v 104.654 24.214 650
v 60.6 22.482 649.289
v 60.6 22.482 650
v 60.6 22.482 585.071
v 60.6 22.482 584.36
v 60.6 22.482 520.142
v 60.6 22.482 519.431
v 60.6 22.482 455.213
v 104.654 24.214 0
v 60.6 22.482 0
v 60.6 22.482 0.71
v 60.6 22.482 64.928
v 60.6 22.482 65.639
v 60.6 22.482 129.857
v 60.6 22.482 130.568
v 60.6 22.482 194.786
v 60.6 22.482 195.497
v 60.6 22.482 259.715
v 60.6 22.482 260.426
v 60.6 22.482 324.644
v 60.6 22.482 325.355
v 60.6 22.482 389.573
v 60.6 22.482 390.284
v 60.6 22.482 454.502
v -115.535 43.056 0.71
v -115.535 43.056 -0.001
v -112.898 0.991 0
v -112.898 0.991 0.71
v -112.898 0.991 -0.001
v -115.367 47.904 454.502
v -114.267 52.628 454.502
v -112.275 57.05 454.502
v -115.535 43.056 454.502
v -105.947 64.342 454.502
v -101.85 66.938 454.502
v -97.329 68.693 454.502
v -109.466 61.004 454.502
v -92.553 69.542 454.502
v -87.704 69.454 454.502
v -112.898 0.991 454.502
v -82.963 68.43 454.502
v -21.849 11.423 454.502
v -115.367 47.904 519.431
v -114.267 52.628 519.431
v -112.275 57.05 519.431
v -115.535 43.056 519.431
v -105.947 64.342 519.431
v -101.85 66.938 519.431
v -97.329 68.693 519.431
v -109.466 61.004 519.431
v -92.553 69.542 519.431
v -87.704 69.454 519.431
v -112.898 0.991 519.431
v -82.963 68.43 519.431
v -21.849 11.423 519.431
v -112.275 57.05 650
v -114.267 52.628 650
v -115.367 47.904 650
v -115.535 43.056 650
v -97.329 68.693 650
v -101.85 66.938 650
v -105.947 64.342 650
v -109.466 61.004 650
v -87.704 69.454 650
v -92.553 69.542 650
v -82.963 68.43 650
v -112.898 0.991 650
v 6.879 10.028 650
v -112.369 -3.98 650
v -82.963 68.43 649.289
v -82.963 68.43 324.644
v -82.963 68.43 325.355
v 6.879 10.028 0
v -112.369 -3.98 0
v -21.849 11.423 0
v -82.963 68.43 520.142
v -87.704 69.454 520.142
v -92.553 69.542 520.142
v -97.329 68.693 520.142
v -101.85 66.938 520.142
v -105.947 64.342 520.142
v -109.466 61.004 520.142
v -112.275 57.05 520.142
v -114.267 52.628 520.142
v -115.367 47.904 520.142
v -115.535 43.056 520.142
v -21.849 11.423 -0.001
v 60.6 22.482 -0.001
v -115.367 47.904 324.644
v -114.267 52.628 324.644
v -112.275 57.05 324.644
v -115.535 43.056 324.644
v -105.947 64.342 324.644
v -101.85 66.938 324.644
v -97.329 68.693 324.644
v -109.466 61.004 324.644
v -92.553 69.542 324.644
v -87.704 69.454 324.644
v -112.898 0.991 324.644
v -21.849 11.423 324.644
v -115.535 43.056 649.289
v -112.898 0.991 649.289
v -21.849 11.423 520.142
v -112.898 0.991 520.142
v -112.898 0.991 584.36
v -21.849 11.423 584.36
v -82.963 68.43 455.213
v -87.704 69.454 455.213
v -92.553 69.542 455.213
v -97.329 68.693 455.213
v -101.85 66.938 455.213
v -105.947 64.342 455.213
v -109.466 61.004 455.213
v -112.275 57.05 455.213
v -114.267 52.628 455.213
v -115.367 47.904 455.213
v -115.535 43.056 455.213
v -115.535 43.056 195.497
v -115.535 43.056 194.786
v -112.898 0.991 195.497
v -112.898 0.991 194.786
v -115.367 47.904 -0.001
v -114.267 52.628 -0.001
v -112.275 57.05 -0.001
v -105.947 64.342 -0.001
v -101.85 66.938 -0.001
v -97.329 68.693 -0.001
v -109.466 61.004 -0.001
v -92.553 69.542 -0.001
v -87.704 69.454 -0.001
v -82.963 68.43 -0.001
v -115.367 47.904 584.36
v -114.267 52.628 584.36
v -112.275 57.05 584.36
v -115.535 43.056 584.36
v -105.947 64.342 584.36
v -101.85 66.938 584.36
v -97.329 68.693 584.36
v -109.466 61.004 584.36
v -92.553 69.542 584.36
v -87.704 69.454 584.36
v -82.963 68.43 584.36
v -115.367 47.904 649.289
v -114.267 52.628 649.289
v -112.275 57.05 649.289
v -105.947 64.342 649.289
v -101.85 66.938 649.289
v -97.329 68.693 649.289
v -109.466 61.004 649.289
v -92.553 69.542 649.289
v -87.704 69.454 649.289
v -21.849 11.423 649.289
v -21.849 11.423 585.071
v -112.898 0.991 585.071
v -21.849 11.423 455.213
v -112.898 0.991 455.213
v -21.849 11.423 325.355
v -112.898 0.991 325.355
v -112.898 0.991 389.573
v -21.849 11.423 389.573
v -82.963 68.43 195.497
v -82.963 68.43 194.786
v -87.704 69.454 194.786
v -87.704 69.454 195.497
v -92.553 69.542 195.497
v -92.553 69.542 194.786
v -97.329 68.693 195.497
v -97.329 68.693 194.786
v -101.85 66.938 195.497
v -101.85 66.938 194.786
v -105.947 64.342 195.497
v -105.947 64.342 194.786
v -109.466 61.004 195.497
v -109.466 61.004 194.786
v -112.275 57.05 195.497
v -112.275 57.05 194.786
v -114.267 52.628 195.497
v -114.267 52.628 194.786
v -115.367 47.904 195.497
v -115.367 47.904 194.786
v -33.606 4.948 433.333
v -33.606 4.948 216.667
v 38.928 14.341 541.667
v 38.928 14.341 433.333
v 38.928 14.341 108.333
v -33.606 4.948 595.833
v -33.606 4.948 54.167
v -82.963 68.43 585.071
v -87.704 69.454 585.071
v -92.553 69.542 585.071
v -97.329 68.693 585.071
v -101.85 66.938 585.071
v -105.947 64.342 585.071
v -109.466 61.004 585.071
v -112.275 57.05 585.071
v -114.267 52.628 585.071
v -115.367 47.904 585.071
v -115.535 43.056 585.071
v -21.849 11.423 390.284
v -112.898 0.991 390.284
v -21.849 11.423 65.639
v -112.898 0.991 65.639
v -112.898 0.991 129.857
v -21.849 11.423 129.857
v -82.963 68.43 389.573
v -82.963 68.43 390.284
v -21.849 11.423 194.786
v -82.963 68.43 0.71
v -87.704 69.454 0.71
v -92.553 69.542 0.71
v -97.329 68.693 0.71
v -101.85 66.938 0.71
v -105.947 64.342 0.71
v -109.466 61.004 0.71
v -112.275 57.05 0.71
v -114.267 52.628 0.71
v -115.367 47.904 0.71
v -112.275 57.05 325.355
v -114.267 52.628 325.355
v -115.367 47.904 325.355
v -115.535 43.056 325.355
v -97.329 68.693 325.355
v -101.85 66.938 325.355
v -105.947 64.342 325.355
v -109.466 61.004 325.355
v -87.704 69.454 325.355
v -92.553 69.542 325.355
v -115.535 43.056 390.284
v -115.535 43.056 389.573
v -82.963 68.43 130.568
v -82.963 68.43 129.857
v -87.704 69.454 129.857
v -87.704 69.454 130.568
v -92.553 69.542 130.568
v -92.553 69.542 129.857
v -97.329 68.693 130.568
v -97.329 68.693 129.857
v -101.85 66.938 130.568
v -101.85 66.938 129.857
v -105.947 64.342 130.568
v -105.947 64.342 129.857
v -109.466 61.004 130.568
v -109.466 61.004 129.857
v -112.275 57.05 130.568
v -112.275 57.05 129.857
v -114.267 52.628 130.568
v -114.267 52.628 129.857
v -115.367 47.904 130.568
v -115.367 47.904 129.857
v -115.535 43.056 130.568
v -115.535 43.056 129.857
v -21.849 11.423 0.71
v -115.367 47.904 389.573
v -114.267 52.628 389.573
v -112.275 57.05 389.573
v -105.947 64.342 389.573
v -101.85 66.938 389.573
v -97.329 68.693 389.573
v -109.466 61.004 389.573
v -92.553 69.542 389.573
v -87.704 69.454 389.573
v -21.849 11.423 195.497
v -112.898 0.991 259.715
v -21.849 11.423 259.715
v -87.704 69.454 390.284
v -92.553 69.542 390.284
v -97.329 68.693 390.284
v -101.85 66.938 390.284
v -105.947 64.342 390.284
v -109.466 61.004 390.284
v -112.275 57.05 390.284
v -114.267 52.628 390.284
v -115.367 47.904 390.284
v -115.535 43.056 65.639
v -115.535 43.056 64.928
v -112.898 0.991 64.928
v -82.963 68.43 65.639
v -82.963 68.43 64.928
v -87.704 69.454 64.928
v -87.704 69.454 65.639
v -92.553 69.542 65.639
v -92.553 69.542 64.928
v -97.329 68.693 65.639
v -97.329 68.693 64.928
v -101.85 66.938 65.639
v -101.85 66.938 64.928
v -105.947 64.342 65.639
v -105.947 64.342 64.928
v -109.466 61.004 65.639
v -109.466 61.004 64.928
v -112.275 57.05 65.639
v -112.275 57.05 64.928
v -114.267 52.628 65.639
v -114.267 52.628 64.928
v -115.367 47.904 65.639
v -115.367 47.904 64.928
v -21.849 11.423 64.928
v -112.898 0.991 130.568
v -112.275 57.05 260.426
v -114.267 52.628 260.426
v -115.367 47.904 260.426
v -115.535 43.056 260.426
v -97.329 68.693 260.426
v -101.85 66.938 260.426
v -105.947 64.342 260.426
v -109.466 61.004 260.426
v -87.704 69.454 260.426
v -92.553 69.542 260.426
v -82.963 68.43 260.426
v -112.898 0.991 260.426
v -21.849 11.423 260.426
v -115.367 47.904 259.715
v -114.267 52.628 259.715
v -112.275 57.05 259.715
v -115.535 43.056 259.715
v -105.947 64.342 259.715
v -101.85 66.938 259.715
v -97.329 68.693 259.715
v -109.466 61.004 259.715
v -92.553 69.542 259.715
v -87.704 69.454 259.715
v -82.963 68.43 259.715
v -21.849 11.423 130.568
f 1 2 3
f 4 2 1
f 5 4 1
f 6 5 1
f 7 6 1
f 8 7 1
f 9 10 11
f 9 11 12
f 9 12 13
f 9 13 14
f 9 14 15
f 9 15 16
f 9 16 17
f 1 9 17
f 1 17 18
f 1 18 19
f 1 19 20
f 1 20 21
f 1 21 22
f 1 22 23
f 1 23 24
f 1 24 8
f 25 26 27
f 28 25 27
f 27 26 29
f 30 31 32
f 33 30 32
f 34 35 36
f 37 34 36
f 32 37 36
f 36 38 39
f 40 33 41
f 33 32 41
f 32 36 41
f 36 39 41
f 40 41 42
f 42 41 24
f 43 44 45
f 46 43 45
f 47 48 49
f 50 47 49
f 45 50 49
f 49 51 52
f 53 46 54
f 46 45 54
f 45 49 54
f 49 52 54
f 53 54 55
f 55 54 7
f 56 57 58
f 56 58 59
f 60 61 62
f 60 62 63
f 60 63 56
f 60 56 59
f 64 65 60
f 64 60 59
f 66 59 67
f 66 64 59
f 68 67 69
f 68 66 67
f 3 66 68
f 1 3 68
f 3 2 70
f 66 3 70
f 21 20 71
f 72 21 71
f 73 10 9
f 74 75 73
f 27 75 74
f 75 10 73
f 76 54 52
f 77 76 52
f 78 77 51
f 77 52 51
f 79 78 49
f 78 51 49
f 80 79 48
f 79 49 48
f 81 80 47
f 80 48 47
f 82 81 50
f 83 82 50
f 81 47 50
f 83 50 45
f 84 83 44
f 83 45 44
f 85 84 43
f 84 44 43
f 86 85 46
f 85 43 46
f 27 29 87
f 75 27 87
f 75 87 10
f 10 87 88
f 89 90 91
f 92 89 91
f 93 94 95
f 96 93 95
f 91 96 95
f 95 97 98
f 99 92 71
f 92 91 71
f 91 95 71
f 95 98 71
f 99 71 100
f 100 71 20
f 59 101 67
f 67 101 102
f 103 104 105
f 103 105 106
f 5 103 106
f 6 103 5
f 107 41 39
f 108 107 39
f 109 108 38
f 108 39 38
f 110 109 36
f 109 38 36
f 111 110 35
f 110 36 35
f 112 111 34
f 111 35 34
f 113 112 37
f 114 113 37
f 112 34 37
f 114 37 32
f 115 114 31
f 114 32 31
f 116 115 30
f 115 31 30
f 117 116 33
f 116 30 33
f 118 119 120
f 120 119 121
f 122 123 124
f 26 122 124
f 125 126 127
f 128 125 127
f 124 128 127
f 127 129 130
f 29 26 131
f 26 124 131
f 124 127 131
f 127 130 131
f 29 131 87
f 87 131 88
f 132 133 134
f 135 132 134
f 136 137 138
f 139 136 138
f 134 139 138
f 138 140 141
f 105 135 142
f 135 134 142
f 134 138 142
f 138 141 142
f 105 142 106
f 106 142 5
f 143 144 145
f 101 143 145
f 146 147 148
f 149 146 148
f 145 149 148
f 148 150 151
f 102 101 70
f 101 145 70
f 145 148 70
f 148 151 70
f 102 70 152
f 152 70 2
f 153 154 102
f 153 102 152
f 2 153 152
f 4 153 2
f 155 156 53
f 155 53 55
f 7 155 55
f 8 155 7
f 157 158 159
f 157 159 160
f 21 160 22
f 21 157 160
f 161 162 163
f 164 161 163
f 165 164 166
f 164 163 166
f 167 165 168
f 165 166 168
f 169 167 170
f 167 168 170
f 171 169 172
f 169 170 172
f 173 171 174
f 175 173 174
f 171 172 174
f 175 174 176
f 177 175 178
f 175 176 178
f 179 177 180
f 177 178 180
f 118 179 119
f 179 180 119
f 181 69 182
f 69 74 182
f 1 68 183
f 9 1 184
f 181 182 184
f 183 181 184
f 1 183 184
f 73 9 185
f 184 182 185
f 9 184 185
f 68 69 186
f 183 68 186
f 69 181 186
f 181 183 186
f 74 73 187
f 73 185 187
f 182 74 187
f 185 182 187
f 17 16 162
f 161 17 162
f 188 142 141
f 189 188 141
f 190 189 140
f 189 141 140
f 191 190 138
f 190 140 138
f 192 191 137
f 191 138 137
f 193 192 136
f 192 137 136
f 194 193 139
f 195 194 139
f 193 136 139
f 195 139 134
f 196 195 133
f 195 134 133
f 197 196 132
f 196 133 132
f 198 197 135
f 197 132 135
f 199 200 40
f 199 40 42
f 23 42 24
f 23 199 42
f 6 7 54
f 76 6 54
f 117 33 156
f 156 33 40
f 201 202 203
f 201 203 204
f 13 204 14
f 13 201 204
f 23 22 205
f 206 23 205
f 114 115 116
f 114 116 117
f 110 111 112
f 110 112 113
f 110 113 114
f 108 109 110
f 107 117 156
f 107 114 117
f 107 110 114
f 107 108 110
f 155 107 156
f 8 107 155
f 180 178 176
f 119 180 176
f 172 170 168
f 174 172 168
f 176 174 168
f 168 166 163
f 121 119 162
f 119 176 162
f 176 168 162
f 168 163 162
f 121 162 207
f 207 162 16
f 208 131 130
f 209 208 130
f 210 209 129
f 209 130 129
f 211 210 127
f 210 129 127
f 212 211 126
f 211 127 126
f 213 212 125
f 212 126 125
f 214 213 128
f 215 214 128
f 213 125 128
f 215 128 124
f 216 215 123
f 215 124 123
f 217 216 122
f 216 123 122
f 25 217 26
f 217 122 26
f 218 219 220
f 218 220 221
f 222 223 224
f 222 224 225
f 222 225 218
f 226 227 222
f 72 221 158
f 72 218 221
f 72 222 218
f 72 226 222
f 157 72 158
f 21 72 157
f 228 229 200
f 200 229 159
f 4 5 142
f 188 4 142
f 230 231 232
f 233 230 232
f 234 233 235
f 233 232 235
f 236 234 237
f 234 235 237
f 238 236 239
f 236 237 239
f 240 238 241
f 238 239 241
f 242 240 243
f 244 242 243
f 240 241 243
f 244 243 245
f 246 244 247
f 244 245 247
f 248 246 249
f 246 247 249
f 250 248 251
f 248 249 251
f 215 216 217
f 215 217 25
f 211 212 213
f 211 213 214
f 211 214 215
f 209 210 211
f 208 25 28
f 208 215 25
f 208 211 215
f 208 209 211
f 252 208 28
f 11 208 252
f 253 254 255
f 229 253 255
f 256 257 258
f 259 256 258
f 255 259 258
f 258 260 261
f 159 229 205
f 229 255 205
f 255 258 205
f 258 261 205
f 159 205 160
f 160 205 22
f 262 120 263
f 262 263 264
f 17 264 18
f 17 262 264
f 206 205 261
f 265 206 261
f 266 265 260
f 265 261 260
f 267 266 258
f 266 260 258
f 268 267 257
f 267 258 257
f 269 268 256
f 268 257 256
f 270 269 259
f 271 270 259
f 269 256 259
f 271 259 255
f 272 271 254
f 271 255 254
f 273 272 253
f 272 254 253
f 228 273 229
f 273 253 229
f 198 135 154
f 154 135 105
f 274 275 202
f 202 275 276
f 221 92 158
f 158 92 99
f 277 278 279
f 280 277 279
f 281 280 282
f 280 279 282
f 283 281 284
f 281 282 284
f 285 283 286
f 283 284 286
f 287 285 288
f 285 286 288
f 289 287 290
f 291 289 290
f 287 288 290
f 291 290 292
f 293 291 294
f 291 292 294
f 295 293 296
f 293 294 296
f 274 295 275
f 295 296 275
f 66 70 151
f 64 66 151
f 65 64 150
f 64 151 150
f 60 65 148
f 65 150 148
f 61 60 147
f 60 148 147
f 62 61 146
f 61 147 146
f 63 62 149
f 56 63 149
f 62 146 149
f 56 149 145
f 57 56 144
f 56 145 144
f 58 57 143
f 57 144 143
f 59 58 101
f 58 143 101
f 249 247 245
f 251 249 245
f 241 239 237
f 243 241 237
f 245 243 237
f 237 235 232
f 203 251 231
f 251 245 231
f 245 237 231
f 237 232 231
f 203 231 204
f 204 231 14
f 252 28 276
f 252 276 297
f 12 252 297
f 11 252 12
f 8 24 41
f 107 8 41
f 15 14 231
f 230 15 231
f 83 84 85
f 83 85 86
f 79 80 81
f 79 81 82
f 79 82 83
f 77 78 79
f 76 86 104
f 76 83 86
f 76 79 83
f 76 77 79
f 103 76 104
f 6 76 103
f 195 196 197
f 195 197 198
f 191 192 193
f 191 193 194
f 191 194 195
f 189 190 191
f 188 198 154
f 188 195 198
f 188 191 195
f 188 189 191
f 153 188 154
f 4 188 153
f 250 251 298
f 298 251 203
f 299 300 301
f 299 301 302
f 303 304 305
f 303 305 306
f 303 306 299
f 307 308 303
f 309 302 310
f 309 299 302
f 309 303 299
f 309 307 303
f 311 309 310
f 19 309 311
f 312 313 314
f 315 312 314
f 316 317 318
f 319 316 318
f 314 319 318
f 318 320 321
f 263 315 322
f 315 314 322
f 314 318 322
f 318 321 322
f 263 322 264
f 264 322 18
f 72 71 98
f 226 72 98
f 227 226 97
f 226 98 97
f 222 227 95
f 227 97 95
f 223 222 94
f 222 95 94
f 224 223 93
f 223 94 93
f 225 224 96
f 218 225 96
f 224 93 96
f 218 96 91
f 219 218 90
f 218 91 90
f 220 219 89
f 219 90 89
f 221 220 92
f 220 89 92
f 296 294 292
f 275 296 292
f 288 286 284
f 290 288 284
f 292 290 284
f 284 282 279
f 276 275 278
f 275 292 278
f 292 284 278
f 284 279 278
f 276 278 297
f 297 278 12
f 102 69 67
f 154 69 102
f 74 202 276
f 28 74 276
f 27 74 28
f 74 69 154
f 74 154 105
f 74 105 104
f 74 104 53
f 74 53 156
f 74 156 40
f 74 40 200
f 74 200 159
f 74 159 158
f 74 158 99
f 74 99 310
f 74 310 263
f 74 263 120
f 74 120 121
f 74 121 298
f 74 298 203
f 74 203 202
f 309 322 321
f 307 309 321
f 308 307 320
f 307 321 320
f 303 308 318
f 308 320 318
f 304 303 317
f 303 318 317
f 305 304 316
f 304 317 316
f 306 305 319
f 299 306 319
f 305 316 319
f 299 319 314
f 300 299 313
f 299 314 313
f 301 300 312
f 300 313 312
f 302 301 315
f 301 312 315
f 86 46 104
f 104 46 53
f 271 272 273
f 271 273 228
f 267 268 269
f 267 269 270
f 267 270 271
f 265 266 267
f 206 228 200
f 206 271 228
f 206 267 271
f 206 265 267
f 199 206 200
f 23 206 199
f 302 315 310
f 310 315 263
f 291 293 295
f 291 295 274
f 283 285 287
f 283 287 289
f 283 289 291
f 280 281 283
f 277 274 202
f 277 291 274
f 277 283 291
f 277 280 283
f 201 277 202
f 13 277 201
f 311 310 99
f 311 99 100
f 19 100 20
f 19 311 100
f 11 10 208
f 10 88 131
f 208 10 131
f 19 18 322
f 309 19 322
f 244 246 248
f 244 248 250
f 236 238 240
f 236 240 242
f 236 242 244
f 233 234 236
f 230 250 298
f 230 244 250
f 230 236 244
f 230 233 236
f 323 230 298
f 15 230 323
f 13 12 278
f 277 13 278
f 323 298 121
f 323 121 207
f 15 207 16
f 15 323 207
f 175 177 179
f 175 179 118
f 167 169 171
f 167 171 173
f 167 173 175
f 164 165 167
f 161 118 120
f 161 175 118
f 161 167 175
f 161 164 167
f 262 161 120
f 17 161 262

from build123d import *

# Parameters (mm, degrees)
BOSS_EXTRUDE1_DEPTH = 650
BOSS_EXTRUDE2_START = -0.7112
BOSS_EXTRUDE2_DEPTH = 0.7112
LPATTERN1_COUNT     = 11
LPATTERN1_PITCH     = 64.929


# Read off the part's stored shape, not the designer's step: Boss-Extrude2
with BuildPart() as part:
    # Sketch1 → Boss-Extrude1 (new body)
    with BuildSketch(Plane.XY):
        with BuildLine():
            add(Edge.make_bspline(
                [(-112.898494578, 0.99146631), (-110.355982987, 1.262339099), (-105.259380368, 1.808389528), (-95.162712882, 2.902575782), (-82.658600361, 4.281227817), (-67.864804262, 5.950995414), (-48.419089864, 8.198779354), (-24.648701462, 11.048580313), (2.987237789, 14.533371756), (29.350050206, 18.036965667), (47.273220771, 20.55034649), (57.461014612, 22.023800415), (59.555137323, 22.328856294), (60.599627559, 22.481560095)],
                knots=[0.938155776, 0.938155776, 0.938155776, 0.938155776, 0.940088408, 0.94202104, 0.945886304, 0.949751568, 0.953616832, 0.96134736, 0.969077888, 0.976808416, 0.984232202, 0.985198518, 0.986164834, 0.986164834, 0.986164834, 0.986164834], degree=3))
            Line((60.599627559, 22.481560095), (104.654430058, 24.21413648))
            add(Edge.make_bspline(
                [(-112.368804727, -3.980397391), (-30.684146875, 4.722080559), (42.524377626, 14.095206887), (104.654430058, 24.21413648)],
                knots=[0.938155776, 0.938155776, 0.938155776, 0.938155776, 1, 1, 1, 1], degree=3))
            Line((-112.368804727, -3.980397391), (-112.898494578, 0.99146631))
        make_face()
    extrude(amount=BOSS_EXTRUDE1_DEPTH)

    # Boss-Extrude2 outline → Boss-Extrude2 (add)
    with BuildSketch(Plane.XY.offset(650).offset(BOSS_EXTRUDE2_START)):
        with BuildLine():
            ThreePointArc((-82.963014518, 68.430375082), (-105.947446125, 64.342164511), (-115.534774611, 43.056472263))
            Line((-115.534774611, 43.056472263), (-112.898494578, 0.99146631))
            add(Edge.make_bspline(
                [(-112.898494578, 0.99146631), (-110.355982987, 1.262339099), (-105.259380368, 1.808389528), (-95.162712882, 2.902575782), (-82.658600361, 4.281227817), (-67.864804262, 5.950995414), (-48.419089864, 8.198779354), (-24.648701462, 11.048580313), (2.987237789, 14.533371756), (29.350050206, 18.036965667), (47.273220771, 20.55034649), (57.461014612, 22.023800415), (59.555137323, 22.328856294), (60.599627559, 22.481560095)],
                knots=[0.938155776, 0.938155776, 0.938155776, 0.938155776, 0.940088408, 0.94202104, 0.945886304, 0.949751568, 0.953616832, 0.96134736, 0.969077888, 0.976808416, 0.984232202, 0.985198518, 0.986164834, 0.986164834, 0.986164834, 0.986164834], degree=3))
            Line((60.599627559, 22.481560095), (-82.963014518, 68.430375082))
        make_face()
    boss_extrude2 = extrude(amount=BOSS_EXTRUDE2_DEPTH)

    # LPattern1: Boss-Extrude2 ×11
    with Locations(*[(0, 0, -i * LPATTERN1_PITCH) for i in range(1, LPATTERN1_COUNT)]):
        add(boss_extrude2)


solid = part.part
